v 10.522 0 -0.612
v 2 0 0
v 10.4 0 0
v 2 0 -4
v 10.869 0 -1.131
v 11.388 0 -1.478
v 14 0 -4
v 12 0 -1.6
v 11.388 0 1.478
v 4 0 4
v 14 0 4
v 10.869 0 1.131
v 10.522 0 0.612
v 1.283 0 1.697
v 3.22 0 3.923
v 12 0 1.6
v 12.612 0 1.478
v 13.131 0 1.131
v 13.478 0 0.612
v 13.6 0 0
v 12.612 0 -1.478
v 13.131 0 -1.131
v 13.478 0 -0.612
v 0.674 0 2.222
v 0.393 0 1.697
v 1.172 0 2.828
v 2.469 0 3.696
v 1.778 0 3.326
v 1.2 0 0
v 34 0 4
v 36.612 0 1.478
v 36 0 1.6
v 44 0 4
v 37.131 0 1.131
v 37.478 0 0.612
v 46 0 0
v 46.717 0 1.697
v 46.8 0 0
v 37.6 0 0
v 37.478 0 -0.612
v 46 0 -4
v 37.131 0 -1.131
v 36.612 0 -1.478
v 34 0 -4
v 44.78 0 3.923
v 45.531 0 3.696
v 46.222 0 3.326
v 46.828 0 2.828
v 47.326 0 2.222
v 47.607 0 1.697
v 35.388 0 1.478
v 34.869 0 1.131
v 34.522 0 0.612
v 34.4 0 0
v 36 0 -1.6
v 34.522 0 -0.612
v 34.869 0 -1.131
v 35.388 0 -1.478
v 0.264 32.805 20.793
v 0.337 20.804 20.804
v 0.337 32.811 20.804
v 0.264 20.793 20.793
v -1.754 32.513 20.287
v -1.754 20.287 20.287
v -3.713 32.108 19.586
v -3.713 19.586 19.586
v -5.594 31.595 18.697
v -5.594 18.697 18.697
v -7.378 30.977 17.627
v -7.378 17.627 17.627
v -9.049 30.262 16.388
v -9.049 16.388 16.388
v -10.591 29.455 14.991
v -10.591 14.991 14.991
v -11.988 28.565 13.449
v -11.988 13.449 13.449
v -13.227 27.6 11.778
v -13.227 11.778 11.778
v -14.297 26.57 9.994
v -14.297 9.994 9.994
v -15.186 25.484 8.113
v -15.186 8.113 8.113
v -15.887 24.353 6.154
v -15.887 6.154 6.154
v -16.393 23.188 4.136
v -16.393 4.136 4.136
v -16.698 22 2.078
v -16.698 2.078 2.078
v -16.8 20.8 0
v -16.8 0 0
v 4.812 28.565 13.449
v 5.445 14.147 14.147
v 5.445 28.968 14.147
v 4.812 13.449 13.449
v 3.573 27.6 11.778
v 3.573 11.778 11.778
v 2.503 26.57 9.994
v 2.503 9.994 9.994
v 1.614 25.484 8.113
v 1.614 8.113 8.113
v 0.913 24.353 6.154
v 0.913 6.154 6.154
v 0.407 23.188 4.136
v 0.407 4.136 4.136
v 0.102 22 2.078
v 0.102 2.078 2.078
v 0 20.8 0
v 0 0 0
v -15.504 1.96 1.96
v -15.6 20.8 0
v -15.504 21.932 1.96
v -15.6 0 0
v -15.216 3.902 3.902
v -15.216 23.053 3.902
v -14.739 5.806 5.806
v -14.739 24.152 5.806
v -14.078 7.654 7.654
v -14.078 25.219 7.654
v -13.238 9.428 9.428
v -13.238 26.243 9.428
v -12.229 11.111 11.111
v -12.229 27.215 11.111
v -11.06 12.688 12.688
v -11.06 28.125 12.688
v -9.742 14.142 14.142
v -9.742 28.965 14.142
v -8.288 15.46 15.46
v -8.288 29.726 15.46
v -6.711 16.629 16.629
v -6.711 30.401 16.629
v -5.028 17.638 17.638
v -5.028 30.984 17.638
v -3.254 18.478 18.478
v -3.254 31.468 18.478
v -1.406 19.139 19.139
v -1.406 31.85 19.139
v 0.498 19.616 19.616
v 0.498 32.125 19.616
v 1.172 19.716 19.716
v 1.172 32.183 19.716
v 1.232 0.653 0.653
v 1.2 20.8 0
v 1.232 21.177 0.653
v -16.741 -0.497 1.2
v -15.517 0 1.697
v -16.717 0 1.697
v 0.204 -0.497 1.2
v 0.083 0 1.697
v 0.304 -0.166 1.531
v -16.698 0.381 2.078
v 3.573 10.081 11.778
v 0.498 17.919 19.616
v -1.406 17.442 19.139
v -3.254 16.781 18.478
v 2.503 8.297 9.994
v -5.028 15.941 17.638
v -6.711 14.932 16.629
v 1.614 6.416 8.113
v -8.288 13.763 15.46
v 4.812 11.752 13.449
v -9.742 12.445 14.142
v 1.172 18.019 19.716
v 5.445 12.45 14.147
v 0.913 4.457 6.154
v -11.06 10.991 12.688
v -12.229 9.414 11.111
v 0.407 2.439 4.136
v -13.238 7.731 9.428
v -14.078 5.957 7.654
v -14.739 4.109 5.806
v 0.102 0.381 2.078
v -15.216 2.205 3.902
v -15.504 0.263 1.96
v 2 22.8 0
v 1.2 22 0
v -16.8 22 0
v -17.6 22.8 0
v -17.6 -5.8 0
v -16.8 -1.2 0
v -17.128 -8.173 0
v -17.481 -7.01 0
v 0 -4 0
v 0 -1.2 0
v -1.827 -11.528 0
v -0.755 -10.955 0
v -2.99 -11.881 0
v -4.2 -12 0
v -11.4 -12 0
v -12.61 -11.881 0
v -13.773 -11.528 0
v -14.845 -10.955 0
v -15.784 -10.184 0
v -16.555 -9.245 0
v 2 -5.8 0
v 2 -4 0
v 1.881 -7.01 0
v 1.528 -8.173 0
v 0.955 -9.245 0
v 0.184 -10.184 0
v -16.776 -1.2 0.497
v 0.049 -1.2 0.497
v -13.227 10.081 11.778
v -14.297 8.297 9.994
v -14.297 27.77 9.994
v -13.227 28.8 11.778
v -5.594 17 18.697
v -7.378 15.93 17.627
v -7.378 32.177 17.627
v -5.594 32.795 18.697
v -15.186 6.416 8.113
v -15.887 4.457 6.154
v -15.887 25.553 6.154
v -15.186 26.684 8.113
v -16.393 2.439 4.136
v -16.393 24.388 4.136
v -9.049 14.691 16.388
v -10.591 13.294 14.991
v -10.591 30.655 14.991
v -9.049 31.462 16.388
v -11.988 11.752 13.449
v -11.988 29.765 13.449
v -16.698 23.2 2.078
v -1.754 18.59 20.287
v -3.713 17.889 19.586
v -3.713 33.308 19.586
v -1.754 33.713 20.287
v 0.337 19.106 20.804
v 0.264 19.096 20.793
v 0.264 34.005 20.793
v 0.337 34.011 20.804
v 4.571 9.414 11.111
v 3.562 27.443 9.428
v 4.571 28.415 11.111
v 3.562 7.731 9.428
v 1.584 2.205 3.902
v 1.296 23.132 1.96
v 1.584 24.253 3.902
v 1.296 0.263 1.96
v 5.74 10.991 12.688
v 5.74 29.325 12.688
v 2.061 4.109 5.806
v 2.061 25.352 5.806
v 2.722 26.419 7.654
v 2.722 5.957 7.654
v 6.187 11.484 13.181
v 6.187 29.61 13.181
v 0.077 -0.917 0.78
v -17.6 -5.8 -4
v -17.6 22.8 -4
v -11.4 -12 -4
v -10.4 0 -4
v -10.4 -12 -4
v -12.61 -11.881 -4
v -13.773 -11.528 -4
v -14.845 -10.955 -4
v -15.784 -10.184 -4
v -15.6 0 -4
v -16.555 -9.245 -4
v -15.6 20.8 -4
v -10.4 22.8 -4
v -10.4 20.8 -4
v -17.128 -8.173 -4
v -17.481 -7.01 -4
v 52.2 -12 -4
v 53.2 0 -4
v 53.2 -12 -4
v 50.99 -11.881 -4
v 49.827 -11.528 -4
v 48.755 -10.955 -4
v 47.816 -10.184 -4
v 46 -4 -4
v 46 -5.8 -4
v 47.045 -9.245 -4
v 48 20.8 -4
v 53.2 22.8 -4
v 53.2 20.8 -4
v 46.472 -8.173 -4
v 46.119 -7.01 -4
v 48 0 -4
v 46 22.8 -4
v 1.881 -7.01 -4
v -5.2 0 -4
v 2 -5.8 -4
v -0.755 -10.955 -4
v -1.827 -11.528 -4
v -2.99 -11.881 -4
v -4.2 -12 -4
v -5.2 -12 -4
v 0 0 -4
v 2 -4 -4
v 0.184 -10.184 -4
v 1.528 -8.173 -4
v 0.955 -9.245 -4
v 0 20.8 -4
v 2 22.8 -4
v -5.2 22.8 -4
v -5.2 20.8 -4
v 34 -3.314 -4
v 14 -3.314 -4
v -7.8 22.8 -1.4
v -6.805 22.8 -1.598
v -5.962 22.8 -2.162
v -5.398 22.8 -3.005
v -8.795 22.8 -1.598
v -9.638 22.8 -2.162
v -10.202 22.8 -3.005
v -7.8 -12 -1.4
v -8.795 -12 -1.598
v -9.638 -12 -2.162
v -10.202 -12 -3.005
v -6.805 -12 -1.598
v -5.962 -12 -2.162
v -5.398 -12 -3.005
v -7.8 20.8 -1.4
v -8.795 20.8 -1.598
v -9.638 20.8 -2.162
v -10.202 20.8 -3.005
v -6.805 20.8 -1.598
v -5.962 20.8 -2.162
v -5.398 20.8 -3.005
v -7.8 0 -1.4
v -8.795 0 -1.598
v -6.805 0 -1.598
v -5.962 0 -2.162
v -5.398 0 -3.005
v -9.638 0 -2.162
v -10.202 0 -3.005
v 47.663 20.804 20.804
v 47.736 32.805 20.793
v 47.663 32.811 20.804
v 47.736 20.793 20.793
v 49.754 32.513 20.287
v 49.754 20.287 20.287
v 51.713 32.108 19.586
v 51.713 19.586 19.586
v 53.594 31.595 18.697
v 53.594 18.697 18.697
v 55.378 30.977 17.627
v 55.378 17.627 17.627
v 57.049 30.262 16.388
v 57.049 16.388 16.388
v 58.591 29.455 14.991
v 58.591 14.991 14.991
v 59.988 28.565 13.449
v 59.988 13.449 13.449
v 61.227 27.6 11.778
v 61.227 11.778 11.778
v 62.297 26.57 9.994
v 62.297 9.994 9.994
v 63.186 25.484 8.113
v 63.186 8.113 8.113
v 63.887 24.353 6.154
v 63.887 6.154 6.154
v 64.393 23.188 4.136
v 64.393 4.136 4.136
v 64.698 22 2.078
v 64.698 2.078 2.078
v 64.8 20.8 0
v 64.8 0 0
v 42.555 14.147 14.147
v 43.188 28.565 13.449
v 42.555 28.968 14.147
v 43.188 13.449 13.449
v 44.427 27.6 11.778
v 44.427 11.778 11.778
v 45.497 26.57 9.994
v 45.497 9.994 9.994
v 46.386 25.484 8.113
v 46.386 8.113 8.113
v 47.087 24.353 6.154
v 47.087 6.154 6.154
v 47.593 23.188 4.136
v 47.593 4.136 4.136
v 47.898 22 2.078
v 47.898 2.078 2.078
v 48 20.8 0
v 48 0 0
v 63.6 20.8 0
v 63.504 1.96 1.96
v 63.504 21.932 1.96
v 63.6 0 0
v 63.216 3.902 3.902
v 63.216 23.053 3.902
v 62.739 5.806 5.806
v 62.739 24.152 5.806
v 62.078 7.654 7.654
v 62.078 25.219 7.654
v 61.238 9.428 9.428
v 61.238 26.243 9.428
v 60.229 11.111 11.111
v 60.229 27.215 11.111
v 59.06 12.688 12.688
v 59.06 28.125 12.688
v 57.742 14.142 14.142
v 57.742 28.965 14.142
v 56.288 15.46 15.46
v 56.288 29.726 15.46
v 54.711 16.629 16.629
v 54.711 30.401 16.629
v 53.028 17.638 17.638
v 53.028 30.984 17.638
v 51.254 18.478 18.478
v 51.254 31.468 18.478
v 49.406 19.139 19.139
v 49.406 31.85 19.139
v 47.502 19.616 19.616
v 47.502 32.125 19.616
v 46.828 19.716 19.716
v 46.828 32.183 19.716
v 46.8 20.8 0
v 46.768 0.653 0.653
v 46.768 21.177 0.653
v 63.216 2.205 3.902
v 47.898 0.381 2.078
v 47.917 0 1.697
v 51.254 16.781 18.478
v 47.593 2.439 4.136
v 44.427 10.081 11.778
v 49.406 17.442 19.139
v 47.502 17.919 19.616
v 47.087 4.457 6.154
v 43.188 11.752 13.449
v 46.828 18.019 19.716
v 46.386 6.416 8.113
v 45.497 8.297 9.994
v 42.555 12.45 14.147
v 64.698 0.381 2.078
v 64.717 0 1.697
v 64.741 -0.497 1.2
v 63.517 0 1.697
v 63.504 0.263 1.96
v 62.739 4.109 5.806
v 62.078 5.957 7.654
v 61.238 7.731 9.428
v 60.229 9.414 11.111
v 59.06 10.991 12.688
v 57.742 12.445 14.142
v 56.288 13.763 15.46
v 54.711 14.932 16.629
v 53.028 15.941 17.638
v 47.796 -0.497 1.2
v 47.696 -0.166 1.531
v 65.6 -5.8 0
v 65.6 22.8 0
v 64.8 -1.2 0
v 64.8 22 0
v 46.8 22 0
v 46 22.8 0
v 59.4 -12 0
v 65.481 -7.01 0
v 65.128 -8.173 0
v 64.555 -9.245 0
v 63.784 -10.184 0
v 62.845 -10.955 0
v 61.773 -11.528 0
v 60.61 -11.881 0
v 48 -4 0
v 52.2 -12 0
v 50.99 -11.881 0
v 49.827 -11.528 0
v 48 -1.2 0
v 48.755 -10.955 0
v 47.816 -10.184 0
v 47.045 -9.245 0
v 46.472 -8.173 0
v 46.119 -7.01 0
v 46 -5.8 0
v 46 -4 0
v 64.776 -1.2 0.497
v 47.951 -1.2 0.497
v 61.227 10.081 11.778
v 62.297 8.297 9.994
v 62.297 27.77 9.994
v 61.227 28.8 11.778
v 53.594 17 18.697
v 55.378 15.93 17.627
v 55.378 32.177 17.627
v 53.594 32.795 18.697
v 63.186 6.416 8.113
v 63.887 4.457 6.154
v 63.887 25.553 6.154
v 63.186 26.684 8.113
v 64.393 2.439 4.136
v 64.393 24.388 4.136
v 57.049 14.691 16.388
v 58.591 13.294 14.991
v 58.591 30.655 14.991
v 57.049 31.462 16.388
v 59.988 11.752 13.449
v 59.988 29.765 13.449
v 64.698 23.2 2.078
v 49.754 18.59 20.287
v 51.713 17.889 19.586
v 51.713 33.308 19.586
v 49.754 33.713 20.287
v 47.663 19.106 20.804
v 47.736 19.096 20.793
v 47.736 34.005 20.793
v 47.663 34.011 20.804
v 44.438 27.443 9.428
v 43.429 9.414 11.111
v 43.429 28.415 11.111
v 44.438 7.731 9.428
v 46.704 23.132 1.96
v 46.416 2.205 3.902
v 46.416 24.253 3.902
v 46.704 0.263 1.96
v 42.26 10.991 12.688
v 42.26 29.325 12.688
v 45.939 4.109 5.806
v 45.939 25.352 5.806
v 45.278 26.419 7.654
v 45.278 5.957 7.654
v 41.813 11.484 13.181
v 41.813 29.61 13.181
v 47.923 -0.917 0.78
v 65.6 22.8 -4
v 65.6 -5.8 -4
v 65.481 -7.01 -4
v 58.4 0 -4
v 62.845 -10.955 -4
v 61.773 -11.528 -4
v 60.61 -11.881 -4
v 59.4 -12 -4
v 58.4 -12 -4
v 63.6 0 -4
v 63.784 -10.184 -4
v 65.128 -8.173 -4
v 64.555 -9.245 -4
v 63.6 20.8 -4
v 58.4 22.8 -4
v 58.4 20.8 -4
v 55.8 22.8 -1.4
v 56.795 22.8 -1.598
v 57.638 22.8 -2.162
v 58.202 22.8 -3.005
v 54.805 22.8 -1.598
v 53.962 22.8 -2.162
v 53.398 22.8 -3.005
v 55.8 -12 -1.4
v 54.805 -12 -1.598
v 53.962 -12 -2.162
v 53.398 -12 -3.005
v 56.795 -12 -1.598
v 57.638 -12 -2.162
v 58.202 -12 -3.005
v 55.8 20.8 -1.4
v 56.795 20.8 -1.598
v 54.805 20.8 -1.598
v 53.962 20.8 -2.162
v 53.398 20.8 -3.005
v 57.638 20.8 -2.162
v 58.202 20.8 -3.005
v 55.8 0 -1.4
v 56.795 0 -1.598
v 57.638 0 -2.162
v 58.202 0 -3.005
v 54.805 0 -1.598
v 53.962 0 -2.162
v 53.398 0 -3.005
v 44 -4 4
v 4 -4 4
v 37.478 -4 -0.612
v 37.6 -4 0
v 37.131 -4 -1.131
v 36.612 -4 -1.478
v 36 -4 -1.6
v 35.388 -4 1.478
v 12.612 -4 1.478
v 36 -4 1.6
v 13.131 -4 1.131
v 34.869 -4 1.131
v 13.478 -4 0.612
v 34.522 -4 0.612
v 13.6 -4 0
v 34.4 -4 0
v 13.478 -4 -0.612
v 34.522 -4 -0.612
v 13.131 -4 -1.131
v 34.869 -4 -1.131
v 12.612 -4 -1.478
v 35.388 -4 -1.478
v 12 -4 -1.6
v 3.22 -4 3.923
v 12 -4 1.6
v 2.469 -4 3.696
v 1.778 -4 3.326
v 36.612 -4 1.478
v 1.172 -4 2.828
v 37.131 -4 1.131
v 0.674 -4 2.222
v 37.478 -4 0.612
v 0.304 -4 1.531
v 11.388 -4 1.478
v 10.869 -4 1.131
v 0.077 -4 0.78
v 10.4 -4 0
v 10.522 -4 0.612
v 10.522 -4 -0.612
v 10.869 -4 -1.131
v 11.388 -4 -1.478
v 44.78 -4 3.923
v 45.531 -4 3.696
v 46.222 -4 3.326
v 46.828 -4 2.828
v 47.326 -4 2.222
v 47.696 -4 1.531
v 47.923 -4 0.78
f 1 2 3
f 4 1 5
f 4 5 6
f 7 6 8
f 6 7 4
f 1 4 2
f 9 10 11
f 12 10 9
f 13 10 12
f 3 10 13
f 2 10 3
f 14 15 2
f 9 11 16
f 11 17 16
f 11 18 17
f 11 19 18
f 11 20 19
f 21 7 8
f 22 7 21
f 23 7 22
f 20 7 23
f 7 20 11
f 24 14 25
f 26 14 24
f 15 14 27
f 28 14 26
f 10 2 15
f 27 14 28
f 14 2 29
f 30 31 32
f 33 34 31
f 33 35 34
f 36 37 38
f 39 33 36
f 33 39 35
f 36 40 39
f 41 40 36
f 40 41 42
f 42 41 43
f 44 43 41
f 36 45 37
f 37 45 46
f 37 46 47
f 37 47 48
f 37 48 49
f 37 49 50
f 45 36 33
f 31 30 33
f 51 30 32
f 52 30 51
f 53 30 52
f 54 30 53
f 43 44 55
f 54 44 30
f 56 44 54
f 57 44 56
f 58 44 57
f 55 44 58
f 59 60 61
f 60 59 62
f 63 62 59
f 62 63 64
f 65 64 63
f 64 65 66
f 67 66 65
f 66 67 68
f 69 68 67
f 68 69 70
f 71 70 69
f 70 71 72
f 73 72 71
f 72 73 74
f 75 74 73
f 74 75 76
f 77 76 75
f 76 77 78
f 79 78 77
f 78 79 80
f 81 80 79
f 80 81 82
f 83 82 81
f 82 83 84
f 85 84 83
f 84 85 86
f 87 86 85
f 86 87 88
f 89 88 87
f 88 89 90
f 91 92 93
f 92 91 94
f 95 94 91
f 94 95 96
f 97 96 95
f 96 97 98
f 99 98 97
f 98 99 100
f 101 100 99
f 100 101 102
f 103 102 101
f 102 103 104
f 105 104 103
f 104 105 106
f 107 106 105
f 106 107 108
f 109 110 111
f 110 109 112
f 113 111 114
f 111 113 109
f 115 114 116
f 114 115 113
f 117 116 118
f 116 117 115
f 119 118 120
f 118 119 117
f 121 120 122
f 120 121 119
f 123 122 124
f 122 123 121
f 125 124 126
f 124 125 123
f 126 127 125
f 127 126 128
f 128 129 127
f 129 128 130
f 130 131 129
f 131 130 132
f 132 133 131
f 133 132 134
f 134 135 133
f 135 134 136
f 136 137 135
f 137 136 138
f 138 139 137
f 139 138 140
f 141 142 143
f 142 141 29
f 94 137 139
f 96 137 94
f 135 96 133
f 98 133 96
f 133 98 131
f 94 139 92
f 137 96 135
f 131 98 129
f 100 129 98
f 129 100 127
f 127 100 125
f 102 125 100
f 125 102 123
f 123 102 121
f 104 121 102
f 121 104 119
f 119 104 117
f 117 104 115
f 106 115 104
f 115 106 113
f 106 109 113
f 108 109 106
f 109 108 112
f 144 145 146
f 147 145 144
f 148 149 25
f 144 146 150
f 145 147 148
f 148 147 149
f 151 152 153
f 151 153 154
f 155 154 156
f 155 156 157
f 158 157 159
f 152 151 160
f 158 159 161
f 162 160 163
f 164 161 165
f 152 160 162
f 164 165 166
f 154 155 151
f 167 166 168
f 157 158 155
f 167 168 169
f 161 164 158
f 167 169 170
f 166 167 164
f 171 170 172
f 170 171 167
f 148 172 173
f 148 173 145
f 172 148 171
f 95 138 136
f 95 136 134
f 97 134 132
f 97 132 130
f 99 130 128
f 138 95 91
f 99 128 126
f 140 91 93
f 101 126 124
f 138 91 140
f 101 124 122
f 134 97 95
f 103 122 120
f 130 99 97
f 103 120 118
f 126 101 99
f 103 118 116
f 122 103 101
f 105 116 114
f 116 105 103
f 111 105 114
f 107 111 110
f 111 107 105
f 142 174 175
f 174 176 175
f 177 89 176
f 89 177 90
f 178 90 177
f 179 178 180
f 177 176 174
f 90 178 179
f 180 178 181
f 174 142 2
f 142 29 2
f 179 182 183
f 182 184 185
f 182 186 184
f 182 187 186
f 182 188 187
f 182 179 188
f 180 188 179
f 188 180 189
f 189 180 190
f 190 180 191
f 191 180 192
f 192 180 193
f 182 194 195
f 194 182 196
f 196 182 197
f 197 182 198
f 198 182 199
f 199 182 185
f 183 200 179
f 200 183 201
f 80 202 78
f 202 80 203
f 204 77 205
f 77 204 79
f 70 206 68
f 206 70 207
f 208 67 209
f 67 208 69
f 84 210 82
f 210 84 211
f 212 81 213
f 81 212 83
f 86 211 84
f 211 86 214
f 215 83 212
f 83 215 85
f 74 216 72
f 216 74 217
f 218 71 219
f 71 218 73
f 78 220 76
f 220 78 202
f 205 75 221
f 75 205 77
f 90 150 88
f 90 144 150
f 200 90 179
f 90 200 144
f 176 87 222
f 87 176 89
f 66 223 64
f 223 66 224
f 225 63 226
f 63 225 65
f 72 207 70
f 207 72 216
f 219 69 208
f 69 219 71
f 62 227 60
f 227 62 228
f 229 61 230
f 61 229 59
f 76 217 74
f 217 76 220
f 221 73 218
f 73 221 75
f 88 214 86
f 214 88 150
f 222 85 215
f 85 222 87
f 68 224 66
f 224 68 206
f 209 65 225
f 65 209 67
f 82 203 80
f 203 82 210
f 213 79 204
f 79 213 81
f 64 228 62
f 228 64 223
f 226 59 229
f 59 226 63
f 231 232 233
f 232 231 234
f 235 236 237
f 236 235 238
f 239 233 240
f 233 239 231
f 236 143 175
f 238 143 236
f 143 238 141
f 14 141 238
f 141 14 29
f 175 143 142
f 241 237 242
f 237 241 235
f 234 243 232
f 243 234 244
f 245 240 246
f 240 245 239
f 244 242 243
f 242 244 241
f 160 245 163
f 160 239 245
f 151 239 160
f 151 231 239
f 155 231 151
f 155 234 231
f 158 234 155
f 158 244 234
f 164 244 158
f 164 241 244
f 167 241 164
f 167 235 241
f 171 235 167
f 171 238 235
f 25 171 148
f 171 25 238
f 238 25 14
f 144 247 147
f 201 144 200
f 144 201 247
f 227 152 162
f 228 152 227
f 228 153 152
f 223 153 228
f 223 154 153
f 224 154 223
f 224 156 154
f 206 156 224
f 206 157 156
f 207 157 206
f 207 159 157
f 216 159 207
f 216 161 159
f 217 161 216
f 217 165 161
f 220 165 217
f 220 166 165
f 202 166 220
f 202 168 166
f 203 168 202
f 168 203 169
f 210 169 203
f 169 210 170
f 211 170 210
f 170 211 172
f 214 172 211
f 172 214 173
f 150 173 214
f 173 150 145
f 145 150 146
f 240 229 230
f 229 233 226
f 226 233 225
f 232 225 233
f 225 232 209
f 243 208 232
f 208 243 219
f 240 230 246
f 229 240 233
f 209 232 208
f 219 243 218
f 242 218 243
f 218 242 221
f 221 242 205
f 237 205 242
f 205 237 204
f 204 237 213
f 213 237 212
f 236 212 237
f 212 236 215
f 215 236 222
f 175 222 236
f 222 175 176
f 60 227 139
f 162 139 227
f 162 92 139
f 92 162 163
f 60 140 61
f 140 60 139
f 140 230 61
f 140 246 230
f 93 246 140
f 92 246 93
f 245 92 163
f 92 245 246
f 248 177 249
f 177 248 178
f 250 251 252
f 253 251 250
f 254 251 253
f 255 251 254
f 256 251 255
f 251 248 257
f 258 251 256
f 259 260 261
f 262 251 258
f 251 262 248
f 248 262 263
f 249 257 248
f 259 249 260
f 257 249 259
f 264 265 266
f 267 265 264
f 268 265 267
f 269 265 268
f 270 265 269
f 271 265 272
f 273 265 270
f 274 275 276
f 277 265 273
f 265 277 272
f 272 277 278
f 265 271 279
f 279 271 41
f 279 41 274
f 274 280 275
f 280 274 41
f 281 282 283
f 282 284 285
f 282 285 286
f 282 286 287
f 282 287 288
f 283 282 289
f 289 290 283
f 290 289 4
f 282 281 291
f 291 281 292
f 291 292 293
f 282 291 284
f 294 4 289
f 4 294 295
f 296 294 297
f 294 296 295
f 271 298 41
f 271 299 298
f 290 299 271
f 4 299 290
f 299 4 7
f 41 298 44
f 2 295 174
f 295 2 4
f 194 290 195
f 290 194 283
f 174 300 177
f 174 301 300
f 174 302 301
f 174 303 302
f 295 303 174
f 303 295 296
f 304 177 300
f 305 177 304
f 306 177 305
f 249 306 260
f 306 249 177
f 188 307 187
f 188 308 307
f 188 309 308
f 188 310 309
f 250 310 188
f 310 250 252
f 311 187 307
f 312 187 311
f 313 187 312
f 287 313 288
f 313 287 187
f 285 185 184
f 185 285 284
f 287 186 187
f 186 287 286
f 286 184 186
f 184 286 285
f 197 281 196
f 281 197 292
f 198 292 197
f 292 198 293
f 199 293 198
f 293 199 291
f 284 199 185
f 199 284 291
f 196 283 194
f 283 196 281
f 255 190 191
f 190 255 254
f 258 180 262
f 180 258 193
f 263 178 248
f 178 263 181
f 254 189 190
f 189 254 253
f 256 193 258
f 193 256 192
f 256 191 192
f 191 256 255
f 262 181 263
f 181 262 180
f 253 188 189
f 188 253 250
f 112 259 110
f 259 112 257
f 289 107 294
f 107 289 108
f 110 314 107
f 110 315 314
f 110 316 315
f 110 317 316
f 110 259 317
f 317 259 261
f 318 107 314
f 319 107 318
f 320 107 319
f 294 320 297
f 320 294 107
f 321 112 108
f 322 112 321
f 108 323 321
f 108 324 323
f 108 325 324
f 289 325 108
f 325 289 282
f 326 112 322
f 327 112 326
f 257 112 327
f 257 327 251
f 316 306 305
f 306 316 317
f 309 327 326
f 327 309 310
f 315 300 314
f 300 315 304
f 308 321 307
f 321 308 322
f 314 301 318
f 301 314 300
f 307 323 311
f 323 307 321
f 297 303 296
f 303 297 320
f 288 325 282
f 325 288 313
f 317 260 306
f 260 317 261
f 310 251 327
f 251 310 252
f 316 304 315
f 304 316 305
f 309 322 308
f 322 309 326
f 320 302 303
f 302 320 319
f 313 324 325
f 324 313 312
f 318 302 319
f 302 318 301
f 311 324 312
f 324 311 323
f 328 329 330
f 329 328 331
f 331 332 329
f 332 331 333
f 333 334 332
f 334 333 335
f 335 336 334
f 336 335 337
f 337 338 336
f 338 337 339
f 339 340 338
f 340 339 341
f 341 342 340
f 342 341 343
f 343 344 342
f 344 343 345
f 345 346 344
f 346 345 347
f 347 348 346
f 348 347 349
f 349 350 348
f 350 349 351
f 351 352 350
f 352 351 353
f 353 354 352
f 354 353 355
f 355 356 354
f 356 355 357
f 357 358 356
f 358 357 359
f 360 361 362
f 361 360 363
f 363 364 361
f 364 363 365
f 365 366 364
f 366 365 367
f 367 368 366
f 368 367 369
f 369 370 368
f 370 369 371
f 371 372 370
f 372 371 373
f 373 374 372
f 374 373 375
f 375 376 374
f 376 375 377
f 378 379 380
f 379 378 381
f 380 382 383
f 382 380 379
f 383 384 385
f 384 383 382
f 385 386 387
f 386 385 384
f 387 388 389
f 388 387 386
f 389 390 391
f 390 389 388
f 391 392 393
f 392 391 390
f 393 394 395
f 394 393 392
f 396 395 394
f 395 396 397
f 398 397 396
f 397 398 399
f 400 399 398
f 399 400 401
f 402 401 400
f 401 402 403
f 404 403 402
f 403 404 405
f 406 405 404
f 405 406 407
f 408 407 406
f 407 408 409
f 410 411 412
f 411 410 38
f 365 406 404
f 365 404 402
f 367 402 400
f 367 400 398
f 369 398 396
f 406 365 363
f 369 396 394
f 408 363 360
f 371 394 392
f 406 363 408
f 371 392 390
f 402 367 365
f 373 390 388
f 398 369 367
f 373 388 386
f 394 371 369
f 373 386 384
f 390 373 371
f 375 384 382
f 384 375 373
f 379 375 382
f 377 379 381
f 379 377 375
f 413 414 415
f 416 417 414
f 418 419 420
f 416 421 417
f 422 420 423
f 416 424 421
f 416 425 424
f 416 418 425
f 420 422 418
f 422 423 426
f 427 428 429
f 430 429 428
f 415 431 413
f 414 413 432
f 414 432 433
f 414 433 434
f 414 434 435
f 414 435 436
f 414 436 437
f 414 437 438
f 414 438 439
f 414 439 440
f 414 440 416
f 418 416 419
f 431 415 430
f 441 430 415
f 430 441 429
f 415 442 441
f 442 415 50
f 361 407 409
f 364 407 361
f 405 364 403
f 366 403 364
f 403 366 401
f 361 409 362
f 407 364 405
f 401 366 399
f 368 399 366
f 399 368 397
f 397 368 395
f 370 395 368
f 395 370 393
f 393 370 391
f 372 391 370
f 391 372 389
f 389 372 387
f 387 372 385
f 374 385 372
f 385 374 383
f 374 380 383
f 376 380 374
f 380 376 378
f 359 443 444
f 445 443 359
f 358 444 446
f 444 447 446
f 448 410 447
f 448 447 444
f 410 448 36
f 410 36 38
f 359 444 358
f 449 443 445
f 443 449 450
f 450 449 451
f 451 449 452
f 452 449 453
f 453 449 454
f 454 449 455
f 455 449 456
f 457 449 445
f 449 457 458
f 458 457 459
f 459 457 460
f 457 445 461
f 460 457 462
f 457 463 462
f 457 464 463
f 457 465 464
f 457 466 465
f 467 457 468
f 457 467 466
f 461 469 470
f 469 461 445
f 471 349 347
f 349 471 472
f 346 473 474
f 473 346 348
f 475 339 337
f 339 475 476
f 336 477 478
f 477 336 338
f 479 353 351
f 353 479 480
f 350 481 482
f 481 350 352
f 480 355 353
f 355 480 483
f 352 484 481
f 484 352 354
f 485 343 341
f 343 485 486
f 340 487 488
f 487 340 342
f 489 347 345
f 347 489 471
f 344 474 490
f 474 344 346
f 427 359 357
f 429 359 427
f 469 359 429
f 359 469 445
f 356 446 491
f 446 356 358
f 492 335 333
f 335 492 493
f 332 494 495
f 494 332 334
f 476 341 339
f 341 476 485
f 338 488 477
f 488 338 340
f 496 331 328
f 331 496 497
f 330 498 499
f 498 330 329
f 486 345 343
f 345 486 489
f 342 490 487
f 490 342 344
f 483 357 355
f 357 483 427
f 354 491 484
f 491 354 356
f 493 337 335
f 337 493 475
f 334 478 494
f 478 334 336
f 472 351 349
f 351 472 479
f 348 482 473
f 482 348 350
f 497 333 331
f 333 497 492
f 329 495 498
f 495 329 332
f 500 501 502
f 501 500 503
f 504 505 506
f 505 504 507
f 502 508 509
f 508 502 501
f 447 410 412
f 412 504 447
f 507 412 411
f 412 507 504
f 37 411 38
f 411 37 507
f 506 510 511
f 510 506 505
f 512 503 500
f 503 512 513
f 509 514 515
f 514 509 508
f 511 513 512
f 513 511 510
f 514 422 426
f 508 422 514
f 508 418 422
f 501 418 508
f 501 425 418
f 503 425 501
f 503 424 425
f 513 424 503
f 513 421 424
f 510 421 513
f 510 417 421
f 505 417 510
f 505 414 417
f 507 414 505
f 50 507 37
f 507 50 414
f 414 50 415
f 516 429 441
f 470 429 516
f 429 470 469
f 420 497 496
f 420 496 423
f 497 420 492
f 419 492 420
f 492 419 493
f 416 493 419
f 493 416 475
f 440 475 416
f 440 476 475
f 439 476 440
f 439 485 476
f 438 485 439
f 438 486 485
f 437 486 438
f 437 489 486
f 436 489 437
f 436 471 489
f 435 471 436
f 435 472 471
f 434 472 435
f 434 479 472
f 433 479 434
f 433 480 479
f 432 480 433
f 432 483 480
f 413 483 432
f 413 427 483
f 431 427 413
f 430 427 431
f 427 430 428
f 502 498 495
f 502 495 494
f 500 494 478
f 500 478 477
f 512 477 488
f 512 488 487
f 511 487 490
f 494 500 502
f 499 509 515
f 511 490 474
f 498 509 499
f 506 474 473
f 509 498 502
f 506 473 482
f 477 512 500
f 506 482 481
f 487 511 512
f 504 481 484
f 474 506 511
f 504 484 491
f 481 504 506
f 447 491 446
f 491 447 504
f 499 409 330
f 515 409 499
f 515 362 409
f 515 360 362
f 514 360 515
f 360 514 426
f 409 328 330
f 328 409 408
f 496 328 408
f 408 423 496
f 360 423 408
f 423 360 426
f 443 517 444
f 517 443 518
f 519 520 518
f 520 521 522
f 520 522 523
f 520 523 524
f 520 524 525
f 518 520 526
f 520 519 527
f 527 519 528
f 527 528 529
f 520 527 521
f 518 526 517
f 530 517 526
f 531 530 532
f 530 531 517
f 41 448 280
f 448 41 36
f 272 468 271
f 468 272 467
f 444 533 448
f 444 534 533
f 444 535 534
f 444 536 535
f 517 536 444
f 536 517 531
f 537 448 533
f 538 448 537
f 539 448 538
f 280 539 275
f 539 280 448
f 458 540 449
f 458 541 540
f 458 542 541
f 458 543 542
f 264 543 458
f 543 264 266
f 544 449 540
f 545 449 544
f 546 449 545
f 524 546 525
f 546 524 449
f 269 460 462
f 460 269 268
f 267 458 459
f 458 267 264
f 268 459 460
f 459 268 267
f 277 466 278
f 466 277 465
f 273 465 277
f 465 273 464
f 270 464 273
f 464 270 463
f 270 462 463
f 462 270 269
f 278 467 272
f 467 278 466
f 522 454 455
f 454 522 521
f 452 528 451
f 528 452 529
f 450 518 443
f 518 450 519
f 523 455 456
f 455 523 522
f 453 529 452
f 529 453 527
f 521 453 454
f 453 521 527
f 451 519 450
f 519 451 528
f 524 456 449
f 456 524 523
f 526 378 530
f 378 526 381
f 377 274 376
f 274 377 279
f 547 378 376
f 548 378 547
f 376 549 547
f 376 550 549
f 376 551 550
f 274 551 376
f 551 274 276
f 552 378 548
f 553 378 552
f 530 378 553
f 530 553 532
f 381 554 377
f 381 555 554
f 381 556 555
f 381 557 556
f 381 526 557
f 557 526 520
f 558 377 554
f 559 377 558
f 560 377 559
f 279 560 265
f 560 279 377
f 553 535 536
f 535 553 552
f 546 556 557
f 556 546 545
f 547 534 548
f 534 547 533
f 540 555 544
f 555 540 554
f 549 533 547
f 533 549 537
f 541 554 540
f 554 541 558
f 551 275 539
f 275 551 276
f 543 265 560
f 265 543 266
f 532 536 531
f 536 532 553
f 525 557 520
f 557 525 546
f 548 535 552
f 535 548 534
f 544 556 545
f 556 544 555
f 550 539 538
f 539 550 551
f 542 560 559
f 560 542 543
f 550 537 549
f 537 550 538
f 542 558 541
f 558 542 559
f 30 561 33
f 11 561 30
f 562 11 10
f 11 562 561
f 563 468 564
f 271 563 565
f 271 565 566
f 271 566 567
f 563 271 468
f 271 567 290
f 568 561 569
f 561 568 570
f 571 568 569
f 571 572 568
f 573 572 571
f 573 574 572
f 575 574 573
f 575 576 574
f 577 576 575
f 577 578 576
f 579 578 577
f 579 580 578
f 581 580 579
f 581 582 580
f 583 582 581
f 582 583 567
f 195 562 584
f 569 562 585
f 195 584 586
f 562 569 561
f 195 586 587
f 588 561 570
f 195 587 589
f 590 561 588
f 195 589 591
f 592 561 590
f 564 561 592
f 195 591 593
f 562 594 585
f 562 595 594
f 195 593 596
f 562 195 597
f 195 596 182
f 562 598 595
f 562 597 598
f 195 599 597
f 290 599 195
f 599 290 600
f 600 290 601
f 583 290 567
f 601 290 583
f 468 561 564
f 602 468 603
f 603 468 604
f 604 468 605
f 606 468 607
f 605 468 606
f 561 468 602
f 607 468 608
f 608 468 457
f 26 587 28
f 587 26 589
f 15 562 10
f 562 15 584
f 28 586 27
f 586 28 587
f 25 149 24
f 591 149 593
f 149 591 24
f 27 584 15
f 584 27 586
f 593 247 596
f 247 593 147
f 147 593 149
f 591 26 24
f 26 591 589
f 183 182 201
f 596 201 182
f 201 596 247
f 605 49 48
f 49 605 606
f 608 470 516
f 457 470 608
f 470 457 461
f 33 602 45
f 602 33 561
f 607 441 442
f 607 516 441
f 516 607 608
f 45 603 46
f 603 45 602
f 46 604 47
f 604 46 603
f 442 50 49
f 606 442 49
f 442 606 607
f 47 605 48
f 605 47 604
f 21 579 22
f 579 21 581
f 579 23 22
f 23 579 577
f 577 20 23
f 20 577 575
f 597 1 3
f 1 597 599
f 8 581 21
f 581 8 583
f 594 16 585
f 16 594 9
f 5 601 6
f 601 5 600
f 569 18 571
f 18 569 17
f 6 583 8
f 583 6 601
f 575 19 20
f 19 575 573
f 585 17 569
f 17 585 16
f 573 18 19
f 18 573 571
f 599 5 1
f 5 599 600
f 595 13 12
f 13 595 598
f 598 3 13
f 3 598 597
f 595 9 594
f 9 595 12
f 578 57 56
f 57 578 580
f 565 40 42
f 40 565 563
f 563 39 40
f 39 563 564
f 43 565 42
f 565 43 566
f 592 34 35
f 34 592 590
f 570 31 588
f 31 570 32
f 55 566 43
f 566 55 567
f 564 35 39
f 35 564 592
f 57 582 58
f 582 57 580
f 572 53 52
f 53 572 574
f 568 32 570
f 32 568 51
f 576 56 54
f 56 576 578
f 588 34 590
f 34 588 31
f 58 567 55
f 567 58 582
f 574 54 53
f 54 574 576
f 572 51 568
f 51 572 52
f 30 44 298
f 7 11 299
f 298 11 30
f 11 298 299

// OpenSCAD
thickness=1.2;

arc1Diameter=40;
arc1Radius=arc1Diameter/2;
arc2Diameter=40;
arc2Radius=arc2Diameter/2;

blowerCutAngle=37.5;

holeWidth=14+1.6;
holeLength=19.6+1.2;

angle1=-45;
angle2=-30;

fanHolderHeight=4;
fanHolderThiskness=2;
fanHolderWidth=12;
fanHolderTotalLength=holeWidth+2*fanHolderThiskness;
fanHolderHoleRadius=2.6;

connectorLength=48;
connectorHeight=8;
connectorThickness=4;

connectorHoleAngle=22.5;
connectorholeWidth=20;

screwDistance=24;
screwM3Diameter=3+0.2;


module blower()
{
	difference()
	{
		intersection()
		{
			union()
			{
				rotate([-90,0,0])
				{
					linear_extrude(40)
					{
						translate([-arc1Radius-thickness,0])
						difference()
						{
							circle(d=arc1Diameter+2*thickness,$fn=64);
							circle(d=arc1Diameter,$fn=64);
						}
						
						translate([-arc2Radius+holeWidth,0])
						difference()
						{
							circle(d=arc2Diameter+2*thickness,$fn=64);
							circle(d=arc2Diameter,$fn=64);
						}
					}
				}

				rotate([angle1,0,0])
				translate([-50,-thickness,0])
				cube([80,thickness,40]);

				translate([-50,holeLength,0])
				rotate([angle2,0,0])
				cube([80,thickness,40]);
				
				translate([-thickness,-thickness,0])
				cube([holeWidth+2*thickness,thickness,thickness]);
			}
			
			translate([-arc2Radius+holeWidth,-thickness,0])
			rotate([-90,0,0])
			cylinder(d=arc2Diameter+2*thickness,h=40+thickness,$fn=64);
		}
		
		translate([-50,-1,0])
		rotate([-90,0,0])
		cube([100,100,100]);
		
		translate([-arc1Radius-thickness,-1,0])
		rotate([-90,0,0])
		cylinder(d=arc1Diameter,h=40+2,$fn=64);
		
		rotate([angle1,0,0])
		translate([-50,-thickness-40,-10])
		cube([80,40,40]);
		
		translate([-50,holeLength+thickness,0])
		rotate([angle2,0,0])
		cube([80,40,40]);
		
		translate([-30,0,15])
		rotate([0,blowerCutAngle,0])
		cube([20,40,40]);
	}
}

module blowerWithHolder()
{	
	union()
	{
		blower();
		
		difference()
		{
			translate([-fanHolderThiskness,-fanHolderWidth,-fanHolderHeight])
			union()
			{
				radius=fanHolderTotalLength/2-fanHolderHoleRadius-1;
				
				difference()
				{
					cube([fanHolderTotalLength,fanHolderWidth+holeLength+fanHolderThiskness,fanHolderHeight]);
					
					translate([-1,-1,-1])
					cube([radius+1,radius+1,fanHolderHeight+2]);
					
					translate([fanHolderTotalLength-radius,-1,-1])
					cube([radius+1,radius+1,fanHolderHeight+2]);
				}
				
				translate([radius,radius,0])
				cylinder(r=radius,h=fanHolderHeight,$fn=32);
				
				translate([fanHolderTotalLength-radius,radius,0])
				cylinder(r=radius,h=fanHolderHeight,$fn=32);
			}
			
			translate([0,0,-fanHolderHeight])
			cube([holeWidth,holeLength,fanHolderHeight]);
			
			translate([holeWidth/2,-fanHolderWidth-1,-fanHolderHeight])
			rotate([-90,0,0])
			cylinder(r=fanHolderHoleRadius,h=fanHolderWidth+holeLength+fanHolderThiskness+2,$fn=16);
		}
		
	}
}

module dualBlower()
{
	difference()
	{
		union()
		{
			mirror([1,0,0])
			blowerWithHolder();
			
			translate([connectorLength,0,0])
			blowerWithHolder();
			
			translate([0,-connectorThickness,-fanHolderHeight])
			union()
			{
				radius=connectorHeight-fanHolderHeight;
				
				difference()
				{
					cube([connectorLength,connectorThickness,connectorHeight]);
					
					translate([-1,-1,fanHolderHeight])
					cube([radius+1,connectorThickness+2,radius+1]);
					
					translate([connectorLength-radius,-1,fanHolderHeight])
					cube([radius+1,connectorThickness+2,radius+1]);
				}
				
				translate([radius,0,fanHolderHeight])
				rotate([-90,0,0])
				cylinder(r=radius,h=connectorThickness,$fn=32);
				
				translate([connectorLength-radius,0,fanHolderHeight])
				rotate([-90,0,0])
				cylinder(r=radius,h=connectorThickness,$fn=32);
			}
		}
		
		translate([connectorLength/2,-connectorThickness-1,-fanHolderHeight+connectorHeight/2])
		{
			translate([-screwDistance/2,0,0])
			rotate([-90,0,0])
			cylinder(d=screwM3Diameter,h=connectorThickness+2,$fn=16);
			
			translate([screwDistance/2,0,0])
			rotate([-90,0,0])
			cylinder(d=screwM3Diameter,h=connectorThickness+2,$fn=16);
		}
		
		translate([(connectorLength-connectorholeWidth)/2,0,connectorHeight-fanHolderHeight])
		rotate([-connectorHoleAngle,0,0])
		translate([0,0,-connectorHeight-10])
		cube([connectorholeWidth,connectorThickness+10,connectorHeight+10]);
	}
}

dualBlower();
